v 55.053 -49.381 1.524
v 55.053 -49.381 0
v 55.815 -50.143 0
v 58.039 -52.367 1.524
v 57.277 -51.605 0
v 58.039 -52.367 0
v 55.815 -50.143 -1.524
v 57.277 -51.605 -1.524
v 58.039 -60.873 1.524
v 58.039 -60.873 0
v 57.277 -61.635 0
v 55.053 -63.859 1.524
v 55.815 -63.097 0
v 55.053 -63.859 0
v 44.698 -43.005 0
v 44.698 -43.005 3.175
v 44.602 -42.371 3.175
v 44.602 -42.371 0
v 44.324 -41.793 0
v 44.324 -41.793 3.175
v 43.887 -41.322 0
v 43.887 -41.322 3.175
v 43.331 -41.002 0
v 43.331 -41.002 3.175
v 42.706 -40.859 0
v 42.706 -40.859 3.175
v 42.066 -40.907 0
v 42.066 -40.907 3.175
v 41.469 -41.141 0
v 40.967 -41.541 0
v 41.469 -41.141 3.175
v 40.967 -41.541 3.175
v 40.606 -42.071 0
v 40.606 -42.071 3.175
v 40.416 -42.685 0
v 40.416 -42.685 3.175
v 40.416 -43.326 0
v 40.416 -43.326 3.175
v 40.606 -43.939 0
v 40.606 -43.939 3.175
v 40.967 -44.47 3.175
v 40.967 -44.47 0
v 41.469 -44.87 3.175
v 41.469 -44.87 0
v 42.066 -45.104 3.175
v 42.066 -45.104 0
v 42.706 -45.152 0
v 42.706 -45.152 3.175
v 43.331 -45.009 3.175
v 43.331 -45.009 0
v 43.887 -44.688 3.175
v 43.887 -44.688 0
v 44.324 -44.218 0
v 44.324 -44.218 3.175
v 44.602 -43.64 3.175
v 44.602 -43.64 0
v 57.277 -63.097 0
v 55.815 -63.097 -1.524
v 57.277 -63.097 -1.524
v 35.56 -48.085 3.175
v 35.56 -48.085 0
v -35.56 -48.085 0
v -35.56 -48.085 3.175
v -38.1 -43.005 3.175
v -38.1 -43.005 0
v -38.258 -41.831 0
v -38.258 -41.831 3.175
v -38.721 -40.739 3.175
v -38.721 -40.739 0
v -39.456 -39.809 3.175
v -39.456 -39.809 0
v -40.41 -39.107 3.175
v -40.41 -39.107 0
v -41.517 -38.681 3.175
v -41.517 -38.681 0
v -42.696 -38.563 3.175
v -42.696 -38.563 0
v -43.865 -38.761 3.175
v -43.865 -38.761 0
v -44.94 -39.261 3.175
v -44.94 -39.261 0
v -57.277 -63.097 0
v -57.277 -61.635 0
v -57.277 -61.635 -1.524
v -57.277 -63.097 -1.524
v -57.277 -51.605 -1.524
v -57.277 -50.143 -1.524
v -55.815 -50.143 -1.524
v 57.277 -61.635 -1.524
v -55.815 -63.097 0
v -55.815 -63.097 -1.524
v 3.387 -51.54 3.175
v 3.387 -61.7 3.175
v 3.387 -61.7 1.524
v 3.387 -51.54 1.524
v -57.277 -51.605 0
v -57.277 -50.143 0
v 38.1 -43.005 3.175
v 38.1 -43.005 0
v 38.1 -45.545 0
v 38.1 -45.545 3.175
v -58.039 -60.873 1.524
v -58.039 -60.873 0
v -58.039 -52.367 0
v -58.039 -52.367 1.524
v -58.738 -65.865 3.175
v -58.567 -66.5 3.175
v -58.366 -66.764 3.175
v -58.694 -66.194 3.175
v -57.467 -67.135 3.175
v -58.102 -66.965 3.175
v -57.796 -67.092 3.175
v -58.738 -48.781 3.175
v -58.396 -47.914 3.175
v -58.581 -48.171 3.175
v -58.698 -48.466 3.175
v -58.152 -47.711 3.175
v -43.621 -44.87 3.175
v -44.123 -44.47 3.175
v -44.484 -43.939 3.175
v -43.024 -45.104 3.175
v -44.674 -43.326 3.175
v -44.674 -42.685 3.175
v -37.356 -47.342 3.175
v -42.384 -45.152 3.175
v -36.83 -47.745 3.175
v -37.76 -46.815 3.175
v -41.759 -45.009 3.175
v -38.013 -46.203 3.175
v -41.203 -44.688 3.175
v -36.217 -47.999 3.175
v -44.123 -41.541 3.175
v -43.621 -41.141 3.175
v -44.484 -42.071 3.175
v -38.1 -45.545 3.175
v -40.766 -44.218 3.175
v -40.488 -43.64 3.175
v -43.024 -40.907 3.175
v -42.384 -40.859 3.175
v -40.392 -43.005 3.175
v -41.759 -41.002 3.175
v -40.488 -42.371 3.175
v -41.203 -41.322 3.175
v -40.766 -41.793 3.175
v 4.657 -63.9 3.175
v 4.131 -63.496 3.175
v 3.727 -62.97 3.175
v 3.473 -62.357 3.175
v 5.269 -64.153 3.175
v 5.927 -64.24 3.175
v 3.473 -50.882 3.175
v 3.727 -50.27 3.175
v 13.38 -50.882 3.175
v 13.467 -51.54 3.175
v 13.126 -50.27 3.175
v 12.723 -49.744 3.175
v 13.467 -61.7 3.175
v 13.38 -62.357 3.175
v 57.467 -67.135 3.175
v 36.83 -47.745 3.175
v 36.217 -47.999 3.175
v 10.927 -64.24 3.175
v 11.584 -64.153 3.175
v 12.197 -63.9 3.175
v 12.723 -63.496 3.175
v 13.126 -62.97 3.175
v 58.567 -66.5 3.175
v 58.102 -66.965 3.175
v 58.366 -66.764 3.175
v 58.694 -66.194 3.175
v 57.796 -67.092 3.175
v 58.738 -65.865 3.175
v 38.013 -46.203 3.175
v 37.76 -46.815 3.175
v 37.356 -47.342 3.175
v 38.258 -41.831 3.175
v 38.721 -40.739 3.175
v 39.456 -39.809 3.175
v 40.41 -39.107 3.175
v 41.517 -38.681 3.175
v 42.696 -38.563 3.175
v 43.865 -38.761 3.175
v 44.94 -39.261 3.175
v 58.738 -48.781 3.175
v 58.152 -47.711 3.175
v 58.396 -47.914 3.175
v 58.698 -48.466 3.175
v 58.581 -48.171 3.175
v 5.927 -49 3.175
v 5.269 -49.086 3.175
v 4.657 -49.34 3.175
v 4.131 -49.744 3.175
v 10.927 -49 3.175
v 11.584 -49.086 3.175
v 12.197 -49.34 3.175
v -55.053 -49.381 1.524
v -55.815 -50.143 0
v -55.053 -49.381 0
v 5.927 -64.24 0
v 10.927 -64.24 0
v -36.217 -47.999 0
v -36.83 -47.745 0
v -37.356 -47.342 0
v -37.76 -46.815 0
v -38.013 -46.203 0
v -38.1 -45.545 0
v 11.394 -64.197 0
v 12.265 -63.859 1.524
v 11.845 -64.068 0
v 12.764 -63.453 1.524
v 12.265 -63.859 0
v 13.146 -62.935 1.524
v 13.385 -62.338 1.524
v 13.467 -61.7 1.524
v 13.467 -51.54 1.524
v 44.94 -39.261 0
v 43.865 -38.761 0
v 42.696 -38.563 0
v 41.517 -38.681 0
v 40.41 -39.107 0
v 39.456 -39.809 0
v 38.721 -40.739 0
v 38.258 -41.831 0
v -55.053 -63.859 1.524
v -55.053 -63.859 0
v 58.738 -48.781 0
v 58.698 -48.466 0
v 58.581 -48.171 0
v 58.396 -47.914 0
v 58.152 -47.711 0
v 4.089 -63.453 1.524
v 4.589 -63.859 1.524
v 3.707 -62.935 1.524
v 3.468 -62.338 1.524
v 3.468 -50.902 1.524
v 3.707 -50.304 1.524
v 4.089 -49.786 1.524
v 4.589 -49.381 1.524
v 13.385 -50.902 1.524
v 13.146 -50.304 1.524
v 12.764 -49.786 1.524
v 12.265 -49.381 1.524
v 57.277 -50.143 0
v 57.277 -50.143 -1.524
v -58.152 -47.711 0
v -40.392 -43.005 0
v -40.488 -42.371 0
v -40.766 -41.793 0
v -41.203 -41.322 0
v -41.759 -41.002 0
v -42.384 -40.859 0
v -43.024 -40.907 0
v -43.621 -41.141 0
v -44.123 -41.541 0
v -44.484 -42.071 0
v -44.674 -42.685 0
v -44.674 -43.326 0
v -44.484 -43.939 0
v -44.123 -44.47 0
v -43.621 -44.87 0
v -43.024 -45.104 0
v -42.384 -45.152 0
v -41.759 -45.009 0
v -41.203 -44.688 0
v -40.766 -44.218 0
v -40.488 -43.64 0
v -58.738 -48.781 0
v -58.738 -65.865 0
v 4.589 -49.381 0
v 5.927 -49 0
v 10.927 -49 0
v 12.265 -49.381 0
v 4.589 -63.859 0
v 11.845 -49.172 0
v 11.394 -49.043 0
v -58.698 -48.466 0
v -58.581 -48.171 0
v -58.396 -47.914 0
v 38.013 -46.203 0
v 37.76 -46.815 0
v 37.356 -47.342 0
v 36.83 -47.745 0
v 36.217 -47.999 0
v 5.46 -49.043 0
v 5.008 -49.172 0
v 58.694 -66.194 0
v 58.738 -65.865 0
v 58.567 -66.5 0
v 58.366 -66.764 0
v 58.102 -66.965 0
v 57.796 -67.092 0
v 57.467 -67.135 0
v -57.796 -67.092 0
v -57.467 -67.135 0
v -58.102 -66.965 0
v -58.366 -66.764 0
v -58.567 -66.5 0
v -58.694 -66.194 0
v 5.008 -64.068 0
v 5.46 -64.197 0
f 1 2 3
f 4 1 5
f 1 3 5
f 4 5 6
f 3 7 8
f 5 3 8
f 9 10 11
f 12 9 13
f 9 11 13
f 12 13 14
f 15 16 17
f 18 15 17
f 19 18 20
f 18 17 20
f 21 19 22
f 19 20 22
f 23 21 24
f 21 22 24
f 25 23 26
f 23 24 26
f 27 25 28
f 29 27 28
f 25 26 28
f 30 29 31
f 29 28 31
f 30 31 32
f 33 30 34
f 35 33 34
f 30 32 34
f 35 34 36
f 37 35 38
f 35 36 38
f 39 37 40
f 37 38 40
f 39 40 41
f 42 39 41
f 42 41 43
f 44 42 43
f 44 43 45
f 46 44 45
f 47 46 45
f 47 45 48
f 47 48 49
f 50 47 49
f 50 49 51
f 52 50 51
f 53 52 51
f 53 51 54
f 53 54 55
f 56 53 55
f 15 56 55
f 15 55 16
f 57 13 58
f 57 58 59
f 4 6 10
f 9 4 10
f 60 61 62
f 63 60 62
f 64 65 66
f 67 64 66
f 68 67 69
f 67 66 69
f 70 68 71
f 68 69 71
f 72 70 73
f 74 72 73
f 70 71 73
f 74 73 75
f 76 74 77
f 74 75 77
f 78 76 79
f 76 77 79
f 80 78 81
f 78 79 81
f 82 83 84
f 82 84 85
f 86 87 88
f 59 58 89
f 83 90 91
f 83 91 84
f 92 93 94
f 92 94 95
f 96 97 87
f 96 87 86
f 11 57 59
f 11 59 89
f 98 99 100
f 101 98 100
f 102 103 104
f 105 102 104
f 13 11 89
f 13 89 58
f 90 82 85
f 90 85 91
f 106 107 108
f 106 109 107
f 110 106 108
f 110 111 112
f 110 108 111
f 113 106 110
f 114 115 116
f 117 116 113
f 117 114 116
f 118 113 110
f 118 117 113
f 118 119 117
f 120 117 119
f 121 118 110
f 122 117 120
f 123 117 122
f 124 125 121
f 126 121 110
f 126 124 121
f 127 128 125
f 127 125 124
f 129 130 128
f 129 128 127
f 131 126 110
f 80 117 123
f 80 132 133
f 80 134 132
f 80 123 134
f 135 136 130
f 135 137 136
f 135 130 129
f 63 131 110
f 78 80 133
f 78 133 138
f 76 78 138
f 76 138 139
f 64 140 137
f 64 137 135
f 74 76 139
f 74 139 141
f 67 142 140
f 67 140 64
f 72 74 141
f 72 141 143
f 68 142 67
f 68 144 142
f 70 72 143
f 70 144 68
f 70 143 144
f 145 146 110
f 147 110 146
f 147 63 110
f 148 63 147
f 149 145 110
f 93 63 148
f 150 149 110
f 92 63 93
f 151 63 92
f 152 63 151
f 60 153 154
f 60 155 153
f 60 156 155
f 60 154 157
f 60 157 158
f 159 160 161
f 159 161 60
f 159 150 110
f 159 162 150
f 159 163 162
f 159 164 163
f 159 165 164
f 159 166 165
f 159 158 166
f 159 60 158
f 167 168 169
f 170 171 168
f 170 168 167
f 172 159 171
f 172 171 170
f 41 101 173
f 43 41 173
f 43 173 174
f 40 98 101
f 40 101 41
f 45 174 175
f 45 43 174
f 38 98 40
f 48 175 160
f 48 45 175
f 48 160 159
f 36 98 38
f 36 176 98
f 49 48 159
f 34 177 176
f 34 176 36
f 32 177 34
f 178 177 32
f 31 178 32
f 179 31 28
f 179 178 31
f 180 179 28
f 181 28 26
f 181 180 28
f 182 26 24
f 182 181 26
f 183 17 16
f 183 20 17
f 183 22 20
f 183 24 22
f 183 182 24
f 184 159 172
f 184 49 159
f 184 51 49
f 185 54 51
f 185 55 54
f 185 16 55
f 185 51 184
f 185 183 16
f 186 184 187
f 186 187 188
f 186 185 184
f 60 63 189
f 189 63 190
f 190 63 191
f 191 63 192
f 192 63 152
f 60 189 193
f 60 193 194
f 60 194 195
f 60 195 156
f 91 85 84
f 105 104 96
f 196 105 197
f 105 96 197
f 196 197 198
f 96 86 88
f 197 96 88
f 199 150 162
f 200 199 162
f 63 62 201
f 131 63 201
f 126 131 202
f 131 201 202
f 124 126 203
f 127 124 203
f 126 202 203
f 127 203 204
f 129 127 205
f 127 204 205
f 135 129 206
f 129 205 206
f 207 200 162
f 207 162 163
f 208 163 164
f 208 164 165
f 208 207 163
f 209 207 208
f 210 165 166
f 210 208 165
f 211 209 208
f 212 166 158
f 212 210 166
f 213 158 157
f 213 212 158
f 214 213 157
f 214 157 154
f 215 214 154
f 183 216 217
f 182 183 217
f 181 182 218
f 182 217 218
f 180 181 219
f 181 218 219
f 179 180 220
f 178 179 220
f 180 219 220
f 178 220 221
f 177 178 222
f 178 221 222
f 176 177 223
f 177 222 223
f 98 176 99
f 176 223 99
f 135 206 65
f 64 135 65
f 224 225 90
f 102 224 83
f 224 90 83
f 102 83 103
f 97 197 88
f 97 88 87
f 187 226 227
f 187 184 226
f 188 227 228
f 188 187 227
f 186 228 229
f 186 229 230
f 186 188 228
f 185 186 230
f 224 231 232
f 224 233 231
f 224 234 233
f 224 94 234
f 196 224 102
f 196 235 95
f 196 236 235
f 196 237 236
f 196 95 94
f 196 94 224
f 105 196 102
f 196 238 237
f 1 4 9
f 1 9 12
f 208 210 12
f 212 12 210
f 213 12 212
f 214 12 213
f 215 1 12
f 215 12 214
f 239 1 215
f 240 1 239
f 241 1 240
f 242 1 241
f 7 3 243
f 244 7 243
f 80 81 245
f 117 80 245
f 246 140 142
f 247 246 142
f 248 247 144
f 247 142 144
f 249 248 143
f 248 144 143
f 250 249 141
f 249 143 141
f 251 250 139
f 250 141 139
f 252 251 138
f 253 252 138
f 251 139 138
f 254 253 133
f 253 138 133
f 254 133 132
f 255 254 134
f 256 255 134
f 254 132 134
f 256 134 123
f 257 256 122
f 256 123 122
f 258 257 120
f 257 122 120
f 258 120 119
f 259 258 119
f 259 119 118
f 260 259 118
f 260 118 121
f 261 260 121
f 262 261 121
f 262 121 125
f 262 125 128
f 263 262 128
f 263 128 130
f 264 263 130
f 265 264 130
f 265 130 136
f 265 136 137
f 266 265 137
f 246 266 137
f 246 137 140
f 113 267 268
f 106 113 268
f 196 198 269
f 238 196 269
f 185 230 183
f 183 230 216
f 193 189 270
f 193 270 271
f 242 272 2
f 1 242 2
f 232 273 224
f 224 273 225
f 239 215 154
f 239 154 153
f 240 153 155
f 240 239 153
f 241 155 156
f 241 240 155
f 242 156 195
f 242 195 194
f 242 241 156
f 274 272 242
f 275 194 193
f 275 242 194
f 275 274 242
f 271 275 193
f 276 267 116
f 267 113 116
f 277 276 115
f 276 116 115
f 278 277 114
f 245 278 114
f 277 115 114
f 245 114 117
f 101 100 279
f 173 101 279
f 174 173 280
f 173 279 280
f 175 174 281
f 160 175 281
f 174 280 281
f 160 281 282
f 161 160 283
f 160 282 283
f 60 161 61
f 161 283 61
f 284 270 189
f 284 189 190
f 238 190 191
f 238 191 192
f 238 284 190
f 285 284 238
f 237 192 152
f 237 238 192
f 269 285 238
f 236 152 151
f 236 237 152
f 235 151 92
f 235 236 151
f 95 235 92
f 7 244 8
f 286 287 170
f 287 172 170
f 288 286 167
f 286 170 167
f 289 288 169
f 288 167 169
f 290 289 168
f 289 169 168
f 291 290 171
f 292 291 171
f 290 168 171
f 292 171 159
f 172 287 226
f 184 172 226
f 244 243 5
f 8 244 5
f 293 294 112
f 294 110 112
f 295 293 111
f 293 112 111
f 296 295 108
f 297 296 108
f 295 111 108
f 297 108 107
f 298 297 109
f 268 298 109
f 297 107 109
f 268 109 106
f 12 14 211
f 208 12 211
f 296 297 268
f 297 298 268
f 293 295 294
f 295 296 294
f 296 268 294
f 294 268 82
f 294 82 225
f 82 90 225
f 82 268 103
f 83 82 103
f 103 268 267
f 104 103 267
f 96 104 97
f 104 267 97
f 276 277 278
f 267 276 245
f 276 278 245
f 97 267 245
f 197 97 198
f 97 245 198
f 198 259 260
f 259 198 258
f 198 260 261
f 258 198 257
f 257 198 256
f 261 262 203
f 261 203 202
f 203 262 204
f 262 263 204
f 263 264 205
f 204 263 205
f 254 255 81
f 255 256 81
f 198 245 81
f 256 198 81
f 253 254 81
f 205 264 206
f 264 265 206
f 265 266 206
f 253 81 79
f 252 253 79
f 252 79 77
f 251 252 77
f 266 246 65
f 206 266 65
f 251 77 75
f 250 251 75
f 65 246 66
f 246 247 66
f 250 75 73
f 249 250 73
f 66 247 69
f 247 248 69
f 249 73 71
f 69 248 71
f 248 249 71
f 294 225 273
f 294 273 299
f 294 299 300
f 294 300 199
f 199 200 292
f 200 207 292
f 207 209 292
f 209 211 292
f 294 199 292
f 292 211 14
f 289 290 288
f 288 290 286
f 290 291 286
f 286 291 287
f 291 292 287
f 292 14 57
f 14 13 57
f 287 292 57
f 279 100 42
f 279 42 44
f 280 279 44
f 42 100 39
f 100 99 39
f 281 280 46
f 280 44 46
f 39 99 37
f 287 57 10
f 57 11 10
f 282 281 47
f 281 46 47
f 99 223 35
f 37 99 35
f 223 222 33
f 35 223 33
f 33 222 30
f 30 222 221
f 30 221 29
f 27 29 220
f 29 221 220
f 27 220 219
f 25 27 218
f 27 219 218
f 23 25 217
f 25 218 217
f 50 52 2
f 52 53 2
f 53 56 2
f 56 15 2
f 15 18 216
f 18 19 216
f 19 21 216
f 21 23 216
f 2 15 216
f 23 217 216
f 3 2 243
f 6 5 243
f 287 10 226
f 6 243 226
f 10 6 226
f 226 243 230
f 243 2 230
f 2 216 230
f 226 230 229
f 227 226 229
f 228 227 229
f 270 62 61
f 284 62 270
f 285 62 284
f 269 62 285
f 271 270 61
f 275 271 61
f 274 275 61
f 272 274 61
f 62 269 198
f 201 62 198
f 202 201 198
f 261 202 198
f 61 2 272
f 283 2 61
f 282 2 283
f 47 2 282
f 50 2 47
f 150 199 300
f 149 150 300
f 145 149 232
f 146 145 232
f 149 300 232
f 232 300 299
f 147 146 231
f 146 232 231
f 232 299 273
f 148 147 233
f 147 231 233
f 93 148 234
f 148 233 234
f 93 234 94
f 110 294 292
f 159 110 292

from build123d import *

# Parameters (mm, degrees)
BOSS_EXTRUDE1_DEPTH   = 3.175
F_6_CLEARANCE_HOLE1_D = 4.3053
FILLET3_R             = 1.27
SKETCH4_W             = 10.08
SKETCH4_H             = 15.24
CUT_EXTRUDE1_DEPTH    = 4.175
FILLET4_R             = 2.54
CUT_EXTRUDE2_DEPTH    = 1.524
BOSS_EXTRUDE2_DEPTH   = 1.524


with BuildPart() as part:
    # Sketch1 → Boss-Extrude1 (new body)
    with BuildSketch(Plane.XY):
        with BuildLine():
            Line((58.7375, -67.1354797), (58.7375, -48.0854797))
            Line((58.7375, -48.0854797), (44.939976119, -39.26086832))
            ThreePointArc((44.939976119, -39.26086832), (40.410479427, -39.106525106), (38.1, -43.0054797))
            Line((38.1, -43.0054797), (38.1, -45.5454797))
            ThreePointArc((38.1, -45.5454797), (37.356051224, -47.341530924), (35.56, -48.0854797))
            Line((35.56, -48.0854797), (-35.56, -48.0854797))
            ThreePointArc((-35.56, -48.0854797), (-37.356051224, -47.341530924), (-38.1, -45.5454797))
            Line((-38.1, -45.5454797), (-38.1, -43.0054797))
            ThreePointArc((-38.1, -43.0054797), (-40.410479427, -39.106525106), (-44.939976119, -39.26086832))
            Line((-44.939976119, -39.26086832), (-58.7375, -48.0854797))
            Line((-58.7375, -48.0854797), (-58.7375, -67.1354797))
            Line((-58.7375, -67.1354797), (58.7375, -67.1354797))
        make_face()
    extrude(amount=BOSS_EXTRUDE1_DEPTH)

    # #6 Clearance Hole1 (through all)
    with Locations(Plane(origin=(0, 0, 0), x_dir=(-1, 0, 0), z_dir=(0, 0, -1))):
        with Locations((42.545, -43.0054797), (-42.545, -43.0054797)):
            Hole(F_6_CLEARANCE_HOLE1_D / 2)

    # Fillet3
    fillet3_edges = [part.edges().sort_by_distance(p)[0] for p in [
        (-58.7375, -67.1354797, 1.5875),
        (-58.7375, -48.0854797, 1.5875),
        (58.7375, -48.0854797, 1.5875),
        (58.7375, -67.1354797, 1.5875),
    ]]
    fillet(fillet3_edges, radius=FILLET3_R)

    # Sketch4 → Cut-Extrude1 (cut, through all)
    with BuildSketch(Plane.XY.offset(3.175)):
        with Locations((8.426666963, -56.6198797)):
            Rectangle(SKETCH4_W, SKETCH4_H)
    extrude(amount=-CUT_EXTRUDE1_DEPTH, mode=Mode.SUBTRACT)

    # Fillet4
    fillet4_edges = [part.edges().sort_by_distance(p)[0] for p in [
        (3.386666963, -64.2398797, 1.5875),
        (3.386666963, -48.9998797, 1.5875),
        (13.466666963, -48.9998797, 1.5875),
        (13.466666963, -64.2398797, 1.5875),
    ]]
    fillet(fillet4_edges, radius=FILLET4_R)

    # Sketch7 → Cut-Extrude2 (cut)
    with BuildSketch(Plane(origin=(0, 0, 0), x_dir=(-1, 0, 0), z_dir=(0, 0, -1))):
        Polygon((58.039, -60.872510434), (58.039, -52.367248965), (55.052630735, -49.3808797), (-55.052631243, -49.3808797), (-58.039000508, -52.367248965), (-58.039000508, -60.872510434), (-55.052631243, -63.8588797), (55.052630735, -63.8588797), align=None)
    extrude(amount=-CUT_EXTRUDE2_DEPTH, mode=Mode.SUBTRACT)

    # Sketch5 → Boss-Extrude2 (add)
    with BuildSketch(Plane(origin=(0, 0, 0), x_dir=(-1, 0, 0), z_dir=(0, 0, -1))):
        Polygon((-55.814631243, -50.1428797), (-57.277000508, -50.1428797), (-57.277000508, -51.605248965), align=None)
        Polygon((-55.814631243, -63.0968797), (-57.277000508, -63.0968797), (-57.277000508, -61.634510434), align=None)
        Polygon((57.277, -61.634510434), (57.277, -63.0968797), (55.814630735, -63.0968797), align=None)
        Polygon((55.814630735, -50.1428797), (57.277, -50.1428797), (57.277, -51.605248965), align=None)
    extrude(amount=BOSS_EXTRUDE2_DEPTH)


solid = part.part
